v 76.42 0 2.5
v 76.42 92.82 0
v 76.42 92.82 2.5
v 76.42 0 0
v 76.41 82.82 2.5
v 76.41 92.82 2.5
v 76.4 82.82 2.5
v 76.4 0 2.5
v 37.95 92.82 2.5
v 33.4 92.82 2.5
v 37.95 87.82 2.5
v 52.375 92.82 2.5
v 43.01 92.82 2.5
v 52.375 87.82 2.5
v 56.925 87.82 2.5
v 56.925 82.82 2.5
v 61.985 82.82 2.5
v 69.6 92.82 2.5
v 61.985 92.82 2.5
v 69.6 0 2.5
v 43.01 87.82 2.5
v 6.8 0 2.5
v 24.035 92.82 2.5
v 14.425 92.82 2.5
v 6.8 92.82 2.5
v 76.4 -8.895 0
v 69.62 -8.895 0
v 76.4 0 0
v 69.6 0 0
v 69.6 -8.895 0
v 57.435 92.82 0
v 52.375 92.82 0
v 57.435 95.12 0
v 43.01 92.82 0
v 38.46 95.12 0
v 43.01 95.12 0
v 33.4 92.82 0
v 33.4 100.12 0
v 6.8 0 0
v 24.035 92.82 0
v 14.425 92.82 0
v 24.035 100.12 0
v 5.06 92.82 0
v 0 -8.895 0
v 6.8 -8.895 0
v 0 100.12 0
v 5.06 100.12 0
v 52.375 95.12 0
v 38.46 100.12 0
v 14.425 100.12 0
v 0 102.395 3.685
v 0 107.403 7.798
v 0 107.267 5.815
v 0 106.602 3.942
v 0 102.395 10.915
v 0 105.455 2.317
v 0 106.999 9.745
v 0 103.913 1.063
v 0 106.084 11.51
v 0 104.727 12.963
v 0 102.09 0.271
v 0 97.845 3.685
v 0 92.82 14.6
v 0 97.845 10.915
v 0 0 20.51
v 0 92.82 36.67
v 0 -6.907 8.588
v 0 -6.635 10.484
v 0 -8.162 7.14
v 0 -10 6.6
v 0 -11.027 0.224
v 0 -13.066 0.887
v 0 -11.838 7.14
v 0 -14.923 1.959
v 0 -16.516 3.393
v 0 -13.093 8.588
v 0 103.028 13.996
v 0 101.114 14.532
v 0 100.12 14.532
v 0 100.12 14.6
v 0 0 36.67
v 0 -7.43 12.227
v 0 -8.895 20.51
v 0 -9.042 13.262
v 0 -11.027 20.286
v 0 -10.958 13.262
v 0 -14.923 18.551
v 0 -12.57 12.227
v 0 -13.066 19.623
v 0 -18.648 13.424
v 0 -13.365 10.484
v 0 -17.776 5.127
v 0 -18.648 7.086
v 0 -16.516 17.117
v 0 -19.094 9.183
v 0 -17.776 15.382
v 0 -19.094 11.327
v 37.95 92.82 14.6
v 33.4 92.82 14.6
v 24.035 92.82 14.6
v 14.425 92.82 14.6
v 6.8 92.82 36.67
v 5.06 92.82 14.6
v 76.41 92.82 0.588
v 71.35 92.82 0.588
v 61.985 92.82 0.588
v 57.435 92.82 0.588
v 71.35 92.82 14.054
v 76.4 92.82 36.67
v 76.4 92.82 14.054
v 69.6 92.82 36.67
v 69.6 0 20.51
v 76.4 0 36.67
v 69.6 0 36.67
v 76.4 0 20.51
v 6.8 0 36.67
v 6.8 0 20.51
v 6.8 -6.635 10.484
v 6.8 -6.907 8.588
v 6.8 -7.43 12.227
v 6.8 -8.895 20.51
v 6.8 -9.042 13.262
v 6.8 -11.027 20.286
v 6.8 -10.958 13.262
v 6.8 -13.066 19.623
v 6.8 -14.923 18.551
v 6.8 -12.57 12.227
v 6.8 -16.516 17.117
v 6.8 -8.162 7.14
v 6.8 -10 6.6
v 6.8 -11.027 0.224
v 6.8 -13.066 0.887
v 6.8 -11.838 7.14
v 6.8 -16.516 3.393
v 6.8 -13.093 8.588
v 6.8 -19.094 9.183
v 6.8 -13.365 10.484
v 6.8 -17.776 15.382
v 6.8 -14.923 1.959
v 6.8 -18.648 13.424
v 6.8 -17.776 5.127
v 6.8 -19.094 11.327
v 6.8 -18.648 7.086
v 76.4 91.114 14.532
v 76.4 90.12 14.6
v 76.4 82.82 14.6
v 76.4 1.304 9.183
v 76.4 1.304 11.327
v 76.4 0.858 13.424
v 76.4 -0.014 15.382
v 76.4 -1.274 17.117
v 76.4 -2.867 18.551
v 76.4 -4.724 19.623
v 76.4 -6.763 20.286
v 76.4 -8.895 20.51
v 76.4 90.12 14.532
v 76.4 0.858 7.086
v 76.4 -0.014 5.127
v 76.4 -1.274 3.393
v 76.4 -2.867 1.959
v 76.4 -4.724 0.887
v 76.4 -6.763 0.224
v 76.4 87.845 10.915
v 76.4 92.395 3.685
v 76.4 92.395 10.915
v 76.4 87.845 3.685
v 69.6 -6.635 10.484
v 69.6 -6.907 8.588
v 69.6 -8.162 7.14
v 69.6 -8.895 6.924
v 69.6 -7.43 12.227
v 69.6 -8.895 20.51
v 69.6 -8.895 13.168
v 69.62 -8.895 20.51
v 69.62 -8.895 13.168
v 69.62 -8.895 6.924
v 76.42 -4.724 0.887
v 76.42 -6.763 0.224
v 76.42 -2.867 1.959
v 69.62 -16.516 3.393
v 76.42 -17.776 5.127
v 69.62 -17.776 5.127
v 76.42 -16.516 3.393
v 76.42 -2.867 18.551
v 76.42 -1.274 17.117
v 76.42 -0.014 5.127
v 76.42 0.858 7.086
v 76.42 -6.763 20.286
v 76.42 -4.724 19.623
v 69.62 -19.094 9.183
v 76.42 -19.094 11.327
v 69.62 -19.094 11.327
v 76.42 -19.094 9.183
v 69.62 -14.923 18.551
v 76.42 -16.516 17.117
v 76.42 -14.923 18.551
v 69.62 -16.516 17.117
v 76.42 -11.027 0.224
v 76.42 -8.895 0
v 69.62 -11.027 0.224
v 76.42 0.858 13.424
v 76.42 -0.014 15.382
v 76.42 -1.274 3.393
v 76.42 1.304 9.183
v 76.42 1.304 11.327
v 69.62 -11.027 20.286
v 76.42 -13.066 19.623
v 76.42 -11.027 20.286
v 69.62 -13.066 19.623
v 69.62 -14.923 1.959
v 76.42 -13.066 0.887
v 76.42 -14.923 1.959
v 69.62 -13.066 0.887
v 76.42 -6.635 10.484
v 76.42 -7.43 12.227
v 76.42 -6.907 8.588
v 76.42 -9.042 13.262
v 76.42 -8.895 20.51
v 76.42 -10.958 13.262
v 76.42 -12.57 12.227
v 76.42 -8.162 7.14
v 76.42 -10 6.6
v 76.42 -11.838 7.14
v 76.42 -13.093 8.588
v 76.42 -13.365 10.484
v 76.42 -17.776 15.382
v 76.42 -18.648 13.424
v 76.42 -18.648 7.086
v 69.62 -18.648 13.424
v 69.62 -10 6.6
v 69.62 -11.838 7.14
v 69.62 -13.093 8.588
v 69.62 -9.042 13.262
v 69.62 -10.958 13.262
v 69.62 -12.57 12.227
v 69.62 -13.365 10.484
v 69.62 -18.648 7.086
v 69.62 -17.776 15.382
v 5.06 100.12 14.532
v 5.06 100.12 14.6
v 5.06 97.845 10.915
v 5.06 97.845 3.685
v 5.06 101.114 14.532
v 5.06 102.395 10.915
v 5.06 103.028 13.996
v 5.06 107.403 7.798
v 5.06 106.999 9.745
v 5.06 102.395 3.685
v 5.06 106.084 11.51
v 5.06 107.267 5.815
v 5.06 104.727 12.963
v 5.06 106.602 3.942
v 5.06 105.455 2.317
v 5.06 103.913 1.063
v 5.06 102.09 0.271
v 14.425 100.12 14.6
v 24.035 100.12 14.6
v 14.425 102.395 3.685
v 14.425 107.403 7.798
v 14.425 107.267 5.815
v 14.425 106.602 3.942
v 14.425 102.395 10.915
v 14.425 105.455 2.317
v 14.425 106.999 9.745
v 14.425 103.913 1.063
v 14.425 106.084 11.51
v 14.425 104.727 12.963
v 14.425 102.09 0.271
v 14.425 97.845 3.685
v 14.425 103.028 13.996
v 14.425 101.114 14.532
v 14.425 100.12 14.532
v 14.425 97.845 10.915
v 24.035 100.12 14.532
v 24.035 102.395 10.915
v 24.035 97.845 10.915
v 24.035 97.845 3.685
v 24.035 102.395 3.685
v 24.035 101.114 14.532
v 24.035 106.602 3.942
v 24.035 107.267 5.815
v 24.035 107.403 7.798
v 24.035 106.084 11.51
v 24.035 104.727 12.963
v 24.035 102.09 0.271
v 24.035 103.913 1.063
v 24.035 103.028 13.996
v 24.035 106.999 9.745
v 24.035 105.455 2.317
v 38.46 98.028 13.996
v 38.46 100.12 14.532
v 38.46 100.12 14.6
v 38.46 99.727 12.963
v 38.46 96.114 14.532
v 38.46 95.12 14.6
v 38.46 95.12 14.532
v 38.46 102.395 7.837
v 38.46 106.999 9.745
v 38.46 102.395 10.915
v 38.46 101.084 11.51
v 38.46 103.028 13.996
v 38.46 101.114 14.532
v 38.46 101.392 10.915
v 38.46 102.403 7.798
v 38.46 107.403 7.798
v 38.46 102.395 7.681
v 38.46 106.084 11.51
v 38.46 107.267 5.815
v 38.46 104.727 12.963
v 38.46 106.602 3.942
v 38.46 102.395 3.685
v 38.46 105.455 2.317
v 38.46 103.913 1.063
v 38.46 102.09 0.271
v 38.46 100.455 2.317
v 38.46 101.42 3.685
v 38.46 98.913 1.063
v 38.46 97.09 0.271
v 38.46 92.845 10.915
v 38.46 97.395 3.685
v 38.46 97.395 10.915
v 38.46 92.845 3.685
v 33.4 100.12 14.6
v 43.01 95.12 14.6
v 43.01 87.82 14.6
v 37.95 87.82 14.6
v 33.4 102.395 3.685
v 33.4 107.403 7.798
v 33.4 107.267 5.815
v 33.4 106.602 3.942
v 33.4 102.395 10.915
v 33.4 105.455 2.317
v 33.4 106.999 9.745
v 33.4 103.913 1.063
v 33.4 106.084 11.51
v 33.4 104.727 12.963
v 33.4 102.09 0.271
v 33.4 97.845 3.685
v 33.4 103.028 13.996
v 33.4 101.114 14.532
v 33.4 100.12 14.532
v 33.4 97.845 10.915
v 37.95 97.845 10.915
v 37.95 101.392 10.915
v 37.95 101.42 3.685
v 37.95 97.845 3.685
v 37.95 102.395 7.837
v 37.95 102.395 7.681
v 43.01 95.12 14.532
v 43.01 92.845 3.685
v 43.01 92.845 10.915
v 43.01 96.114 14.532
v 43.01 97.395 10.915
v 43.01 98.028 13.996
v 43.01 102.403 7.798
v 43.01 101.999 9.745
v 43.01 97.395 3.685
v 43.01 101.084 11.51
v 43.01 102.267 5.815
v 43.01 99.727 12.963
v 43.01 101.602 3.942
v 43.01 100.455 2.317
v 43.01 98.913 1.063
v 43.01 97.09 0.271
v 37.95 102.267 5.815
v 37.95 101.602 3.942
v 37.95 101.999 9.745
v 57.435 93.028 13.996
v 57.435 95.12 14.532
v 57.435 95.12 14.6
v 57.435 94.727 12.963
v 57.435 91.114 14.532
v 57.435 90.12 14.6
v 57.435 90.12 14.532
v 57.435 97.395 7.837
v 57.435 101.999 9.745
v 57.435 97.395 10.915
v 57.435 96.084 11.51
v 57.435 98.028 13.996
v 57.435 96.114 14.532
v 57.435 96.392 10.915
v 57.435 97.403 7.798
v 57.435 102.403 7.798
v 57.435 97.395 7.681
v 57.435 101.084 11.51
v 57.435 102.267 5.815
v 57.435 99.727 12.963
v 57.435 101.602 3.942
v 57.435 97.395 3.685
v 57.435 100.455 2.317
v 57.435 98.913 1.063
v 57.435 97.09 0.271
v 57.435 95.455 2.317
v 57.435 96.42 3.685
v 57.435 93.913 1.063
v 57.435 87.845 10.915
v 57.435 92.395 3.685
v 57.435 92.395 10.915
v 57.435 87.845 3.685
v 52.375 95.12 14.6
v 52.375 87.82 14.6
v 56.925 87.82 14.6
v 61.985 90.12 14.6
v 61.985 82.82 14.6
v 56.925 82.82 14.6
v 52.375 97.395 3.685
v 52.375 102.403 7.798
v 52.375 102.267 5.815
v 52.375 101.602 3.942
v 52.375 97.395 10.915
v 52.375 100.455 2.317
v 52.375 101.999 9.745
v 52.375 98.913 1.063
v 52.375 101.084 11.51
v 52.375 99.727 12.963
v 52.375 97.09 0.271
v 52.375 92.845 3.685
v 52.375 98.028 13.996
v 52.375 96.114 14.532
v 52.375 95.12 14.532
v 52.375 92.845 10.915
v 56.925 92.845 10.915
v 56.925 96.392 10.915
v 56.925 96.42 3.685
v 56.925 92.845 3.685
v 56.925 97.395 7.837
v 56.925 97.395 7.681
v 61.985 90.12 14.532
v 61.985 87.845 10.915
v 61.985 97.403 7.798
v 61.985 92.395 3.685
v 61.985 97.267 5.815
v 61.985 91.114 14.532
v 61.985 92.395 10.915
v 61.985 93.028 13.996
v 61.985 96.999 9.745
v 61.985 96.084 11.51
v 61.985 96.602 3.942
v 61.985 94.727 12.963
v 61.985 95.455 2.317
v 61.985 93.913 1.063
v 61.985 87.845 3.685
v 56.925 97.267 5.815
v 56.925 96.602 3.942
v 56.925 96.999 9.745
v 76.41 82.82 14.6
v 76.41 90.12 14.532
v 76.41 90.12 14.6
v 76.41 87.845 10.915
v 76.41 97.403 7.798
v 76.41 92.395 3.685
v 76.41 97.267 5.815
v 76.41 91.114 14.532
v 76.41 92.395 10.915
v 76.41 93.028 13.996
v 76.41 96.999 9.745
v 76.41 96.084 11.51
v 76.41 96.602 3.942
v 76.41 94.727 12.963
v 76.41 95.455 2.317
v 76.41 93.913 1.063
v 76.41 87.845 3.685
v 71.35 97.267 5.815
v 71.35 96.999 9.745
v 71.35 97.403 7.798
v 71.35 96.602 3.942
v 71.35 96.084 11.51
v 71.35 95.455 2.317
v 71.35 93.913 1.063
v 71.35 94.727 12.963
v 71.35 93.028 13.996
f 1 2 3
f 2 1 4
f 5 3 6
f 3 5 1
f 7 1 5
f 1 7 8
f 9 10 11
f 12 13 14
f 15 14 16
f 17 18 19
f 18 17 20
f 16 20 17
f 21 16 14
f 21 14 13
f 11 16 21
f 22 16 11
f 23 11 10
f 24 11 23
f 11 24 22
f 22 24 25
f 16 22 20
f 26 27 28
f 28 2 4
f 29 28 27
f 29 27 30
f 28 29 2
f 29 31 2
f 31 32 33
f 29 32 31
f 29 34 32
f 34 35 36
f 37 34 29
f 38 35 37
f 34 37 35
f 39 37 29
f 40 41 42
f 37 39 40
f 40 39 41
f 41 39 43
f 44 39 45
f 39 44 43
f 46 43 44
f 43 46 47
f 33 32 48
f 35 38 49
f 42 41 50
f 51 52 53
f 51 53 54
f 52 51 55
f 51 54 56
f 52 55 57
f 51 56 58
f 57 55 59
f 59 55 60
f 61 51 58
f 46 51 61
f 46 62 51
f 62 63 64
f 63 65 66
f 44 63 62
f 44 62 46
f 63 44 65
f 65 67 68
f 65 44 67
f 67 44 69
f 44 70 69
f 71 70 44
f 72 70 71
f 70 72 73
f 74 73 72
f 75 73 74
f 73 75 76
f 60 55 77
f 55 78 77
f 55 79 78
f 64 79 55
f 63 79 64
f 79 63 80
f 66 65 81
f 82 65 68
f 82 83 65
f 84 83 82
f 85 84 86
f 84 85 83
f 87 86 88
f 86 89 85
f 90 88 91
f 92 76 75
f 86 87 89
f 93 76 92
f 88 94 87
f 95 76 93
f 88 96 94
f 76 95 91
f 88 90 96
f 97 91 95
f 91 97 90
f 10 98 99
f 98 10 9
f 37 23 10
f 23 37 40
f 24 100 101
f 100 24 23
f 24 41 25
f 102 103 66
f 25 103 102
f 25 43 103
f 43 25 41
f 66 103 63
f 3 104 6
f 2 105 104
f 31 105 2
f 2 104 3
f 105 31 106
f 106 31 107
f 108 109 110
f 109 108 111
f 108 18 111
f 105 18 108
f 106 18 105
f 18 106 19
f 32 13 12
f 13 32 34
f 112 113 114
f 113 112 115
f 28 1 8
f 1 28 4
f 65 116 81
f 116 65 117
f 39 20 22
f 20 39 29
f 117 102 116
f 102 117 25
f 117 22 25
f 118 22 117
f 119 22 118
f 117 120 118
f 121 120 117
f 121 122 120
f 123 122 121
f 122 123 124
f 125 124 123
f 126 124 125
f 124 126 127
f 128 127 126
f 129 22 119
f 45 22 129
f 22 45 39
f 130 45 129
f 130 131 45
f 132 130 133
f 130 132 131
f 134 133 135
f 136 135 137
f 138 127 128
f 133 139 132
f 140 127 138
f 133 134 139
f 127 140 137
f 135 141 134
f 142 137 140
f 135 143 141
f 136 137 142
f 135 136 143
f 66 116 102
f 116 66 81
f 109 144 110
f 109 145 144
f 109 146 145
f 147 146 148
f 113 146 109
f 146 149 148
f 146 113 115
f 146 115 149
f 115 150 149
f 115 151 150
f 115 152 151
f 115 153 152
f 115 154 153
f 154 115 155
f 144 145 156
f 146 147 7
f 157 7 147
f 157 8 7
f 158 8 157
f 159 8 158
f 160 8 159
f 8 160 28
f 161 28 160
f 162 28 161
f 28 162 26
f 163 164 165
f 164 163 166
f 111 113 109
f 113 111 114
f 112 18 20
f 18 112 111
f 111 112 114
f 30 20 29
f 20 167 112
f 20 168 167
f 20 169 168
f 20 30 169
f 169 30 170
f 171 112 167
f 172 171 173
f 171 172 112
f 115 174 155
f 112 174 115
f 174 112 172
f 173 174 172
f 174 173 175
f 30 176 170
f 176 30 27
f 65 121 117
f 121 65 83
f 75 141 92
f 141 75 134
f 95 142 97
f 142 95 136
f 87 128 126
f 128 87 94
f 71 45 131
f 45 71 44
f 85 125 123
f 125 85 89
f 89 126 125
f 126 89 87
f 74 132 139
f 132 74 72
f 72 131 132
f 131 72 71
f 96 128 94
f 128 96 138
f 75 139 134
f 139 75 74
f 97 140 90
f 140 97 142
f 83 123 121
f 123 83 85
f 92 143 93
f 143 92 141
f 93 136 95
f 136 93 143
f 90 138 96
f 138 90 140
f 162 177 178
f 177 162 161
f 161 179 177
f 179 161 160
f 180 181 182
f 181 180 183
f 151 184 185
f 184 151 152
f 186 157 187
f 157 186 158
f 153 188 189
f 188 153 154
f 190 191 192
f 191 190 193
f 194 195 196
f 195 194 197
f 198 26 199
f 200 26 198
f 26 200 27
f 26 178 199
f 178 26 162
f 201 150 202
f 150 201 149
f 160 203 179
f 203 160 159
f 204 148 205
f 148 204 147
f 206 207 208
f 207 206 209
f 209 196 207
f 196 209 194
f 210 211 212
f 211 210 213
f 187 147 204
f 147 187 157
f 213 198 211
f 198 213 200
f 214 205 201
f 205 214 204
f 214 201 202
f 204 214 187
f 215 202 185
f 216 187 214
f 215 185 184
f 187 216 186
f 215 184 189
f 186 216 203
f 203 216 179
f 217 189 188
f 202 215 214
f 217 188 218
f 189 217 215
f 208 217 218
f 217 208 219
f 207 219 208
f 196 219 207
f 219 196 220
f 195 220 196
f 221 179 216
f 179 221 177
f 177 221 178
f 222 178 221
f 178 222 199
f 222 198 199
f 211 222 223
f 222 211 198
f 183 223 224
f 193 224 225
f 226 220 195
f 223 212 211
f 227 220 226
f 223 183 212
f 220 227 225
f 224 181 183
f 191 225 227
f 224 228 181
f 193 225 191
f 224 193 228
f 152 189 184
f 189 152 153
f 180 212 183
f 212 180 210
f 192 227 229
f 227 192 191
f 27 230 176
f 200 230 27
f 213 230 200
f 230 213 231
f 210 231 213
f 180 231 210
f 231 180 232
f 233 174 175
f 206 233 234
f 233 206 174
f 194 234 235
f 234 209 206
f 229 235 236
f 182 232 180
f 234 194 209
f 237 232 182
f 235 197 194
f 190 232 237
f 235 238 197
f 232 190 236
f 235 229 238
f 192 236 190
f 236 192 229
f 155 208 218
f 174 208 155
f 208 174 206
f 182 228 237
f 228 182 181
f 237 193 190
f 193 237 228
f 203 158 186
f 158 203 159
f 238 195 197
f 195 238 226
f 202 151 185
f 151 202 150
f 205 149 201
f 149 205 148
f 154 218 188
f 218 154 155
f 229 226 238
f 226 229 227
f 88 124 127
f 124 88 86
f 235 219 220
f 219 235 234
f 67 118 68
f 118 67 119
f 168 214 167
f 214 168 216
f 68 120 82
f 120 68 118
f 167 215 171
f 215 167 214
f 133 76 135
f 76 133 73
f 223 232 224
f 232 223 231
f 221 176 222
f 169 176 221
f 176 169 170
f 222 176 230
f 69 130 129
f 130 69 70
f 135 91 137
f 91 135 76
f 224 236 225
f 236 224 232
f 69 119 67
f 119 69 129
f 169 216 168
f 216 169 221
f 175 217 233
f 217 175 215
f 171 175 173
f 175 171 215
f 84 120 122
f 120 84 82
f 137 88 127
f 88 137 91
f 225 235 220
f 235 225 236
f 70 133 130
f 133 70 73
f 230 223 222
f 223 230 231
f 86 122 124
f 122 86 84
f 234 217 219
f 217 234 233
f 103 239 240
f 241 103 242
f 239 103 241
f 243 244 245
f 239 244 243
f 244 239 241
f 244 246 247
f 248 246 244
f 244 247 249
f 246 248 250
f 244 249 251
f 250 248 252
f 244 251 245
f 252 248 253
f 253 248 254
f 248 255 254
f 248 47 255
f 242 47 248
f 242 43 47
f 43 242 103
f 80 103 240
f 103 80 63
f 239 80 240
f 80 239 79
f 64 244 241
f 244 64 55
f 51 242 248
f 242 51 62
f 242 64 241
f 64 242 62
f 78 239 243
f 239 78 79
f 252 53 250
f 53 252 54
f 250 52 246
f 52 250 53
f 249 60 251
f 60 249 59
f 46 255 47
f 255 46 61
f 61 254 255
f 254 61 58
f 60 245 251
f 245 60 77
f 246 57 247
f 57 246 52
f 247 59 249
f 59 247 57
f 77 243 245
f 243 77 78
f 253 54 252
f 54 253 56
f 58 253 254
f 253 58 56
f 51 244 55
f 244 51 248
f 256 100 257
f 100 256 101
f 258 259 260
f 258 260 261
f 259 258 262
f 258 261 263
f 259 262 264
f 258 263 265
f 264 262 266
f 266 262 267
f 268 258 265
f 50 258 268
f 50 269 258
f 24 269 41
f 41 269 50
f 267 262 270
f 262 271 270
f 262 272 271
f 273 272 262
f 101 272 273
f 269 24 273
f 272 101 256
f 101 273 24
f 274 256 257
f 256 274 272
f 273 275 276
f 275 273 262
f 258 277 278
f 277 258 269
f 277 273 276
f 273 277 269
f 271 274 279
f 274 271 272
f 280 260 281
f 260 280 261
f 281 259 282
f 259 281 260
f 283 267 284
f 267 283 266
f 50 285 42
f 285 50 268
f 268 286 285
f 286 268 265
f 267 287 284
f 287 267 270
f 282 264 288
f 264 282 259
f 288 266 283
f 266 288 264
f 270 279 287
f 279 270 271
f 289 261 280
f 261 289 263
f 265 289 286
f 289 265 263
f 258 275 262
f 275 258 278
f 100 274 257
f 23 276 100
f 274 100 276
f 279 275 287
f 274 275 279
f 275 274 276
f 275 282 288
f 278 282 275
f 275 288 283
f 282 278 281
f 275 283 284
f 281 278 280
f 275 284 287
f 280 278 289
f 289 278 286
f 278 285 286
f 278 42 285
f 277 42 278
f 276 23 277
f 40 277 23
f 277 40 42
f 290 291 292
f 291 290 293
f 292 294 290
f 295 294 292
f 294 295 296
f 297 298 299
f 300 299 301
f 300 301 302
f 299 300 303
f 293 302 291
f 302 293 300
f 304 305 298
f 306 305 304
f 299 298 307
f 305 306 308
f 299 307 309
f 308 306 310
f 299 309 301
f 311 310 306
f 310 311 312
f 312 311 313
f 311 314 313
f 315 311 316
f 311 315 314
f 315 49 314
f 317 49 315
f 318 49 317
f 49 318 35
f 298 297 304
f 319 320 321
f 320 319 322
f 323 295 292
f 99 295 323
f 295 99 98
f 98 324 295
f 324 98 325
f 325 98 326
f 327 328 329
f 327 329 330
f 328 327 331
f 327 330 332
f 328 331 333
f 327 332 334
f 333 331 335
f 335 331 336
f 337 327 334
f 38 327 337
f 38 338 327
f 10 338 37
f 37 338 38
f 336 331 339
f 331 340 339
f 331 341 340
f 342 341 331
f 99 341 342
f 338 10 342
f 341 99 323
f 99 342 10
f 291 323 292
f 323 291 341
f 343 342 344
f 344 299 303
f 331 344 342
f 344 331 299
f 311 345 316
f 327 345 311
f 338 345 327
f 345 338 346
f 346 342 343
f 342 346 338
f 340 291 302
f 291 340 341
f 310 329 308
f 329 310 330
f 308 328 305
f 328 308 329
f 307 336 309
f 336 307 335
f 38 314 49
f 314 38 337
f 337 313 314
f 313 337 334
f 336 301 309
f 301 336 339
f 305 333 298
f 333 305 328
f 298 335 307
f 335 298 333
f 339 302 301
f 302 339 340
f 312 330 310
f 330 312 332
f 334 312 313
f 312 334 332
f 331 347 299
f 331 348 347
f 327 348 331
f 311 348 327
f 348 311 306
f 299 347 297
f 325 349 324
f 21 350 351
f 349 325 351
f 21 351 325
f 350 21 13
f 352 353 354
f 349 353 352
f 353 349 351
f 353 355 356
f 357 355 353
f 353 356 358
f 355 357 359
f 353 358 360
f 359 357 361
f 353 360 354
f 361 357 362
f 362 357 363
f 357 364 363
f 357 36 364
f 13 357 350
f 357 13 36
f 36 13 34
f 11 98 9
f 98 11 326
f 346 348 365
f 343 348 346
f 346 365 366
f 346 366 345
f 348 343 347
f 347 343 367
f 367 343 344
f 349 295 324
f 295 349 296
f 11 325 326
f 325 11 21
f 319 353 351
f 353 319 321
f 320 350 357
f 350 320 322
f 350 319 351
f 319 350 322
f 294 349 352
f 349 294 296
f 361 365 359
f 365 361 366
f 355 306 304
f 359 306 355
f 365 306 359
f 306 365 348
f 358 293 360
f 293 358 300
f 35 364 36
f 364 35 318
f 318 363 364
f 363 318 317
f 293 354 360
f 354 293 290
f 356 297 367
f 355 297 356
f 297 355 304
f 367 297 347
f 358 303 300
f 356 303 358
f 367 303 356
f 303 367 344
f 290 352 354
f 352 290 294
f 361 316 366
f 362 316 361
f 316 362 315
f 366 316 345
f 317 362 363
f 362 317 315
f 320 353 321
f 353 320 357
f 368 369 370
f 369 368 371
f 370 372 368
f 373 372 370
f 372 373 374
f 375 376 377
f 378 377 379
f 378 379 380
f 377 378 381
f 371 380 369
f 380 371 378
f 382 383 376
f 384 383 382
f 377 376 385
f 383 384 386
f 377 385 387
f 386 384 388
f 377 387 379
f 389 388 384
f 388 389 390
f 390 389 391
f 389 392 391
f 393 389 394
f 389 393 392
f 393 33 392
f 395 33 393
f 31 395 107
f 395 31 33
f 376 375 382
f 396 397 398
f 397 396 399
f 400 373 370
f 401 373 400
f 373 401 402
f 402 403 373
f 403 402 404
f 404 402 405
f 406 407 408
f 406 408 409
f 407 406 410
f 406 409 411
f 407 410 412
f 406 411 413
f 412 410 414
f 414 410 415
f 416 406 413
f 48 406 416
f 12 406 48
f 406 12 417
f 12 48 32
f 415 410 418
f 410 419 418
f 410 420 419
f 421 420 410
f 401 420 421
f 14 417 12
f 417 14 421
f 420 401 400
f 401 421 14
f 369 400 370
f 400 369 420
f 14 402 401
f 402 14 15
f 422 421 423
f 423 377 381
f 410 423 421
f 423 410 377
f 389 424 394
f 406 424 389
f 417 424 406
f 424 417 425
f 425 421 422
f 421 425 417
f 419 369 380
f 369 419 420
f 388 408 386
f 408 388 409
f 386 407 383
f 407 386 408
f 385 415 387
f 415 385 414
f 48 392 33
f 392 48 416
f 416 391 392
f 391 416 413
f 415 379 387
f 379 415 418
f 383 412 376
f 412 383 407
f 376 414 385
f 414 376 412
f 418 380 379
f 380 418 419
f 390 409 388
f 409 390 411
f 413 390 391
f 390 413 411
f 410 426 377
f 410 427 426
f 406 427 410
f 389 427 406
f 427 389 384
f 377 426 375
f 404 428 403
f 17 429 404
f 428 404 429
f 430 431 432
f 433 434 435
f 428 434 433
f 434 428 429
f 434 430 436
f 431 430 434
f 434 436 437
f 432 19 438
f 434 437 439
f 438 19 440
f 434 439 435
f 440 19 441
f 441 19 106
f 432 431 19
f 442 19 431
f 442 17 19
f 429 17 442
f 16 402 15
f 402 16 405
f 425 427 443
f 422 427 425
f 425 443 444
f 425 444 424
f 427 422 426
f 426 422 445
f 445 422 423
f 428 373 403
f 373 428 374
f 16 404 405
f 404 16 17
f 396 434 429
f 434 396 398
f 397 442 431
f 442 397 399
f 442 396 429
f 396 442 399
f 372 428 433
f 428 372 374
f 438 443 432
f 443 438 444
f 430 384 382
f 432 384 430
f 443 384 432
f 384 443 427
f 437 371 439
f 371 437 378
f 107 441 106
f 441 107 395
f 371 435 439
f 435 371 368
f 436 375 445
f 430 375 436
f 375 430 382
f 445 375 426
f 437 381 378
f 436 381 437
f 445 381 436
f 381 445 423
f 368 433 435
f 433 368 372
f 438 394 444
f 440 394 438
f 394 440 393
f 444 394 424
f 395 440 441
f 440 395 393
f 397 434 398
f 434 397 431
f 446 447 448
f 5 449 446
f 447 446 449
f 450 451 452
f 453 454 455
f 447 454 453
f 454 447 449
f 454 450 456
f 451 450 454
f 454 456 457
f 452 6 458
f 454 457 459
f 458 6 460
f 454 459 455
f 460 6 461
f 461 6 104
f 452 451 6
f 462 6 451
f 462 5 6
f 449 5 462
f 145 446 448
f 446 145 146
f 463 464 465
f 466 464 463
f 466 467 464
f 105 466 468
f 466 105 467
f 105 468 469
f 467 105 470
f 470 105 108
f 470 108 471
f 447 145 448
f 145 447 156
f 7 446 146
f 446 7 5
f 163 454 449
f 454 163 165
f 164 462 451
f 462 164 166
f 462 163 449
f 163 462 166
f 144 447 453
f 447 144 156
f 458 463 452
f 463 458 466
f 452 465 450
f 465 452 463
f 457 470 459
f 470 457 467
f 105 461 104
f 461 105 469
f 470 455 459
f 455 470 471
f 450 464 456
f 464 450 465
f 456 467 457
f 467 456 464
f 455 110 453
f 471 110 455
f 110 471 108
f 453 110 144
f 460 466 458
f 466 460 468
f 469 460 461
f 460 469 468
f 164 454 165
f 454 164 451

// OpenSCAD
x_center = 73;      
x_length = 6.8;     
y_length = 35.58;   
z_length = 20.51;   

// Test
y_center = y_length / 2;


union() {
cube([76.42, 92.82, 2.5]);
cube([6.8,92.82, 36.67]);
translate([x_center - x_length / 2, 0, 0])
    cube([6.8,92.82, 36.67]);
}

difference() {
    union(){
    translate([x_center - x_length / 2, -y_center/2, 0])
    cube([x_length, 3*(y_length/4) , z_length]);

    translate([0, -y_center/2, 0])
    cube([x_length, 3*(y_length/4) , z_length]);
    
    translate([0,-y_length/4, z_length/2])
    rotate([0,90,0])
        cylinder(h=x_length ,d=z_length);
        
    translate([69.62,-y_length/4, z_length/2])
    rotate([0,90,0])
        cylinder(h=x_length ,d=z_length);
    }


translate([-1,-10,10])
    rotate([0,90,0])
    cylinder(r = 3.4, h = 80);
}


x_hole = 20;
y_hole = 4.55;
z_hole = 7.23;
space = 14.425;


union(){
difference() {
    
    translate([0,92.82,0])
        cube([5.06,7.3,14.6]);
    
    translate([-x_hole/2,-y_hole/2+92.82+7.3,-z_hole/2+7.3])
        cube([x_hole,y_hole,z_hole]);

}    

difference(){

    translate([0,92.82+7.3,7.3])
    rotate([0,90,0])
        cylinder(r=7.3, h=5.06);

    translate([-x_hole/2,-y_hole/2+92.82+7.3,-z_hole/2+7.3])
        cube([x_hole,y_hole,z_hole]);
}
}


union(){
difference() {
    
    translate([space,92.82,0])
        cube([5.06,7.3,14.6]);
    
    translate([-x_hole/2+space,-y_hole/2+92.82+7.3,-z_hole/2+7.3])
        cube([x_hole,y_hole,z_hole]);

}    

difference(){

    translate([space,92.82+7.3,7.3])
    rotate([0,90,0])
        cylinder(r=7.3, h=5.06);

    translate([-x_hole/2+space,-y_hole/2+92.82+7.3,-z_hole/2+7.3])
        cube([x_hole,y_hole,z_hole]);
}
}

union(){
difference() {
    
    translate([space+y_hole,92.82,0])
        cube([5.06,7.3,14.6]);
    
    translate([-x_hole/2+space+y_hole,-y_hole/2+92.82+7.3,-z_hole/2+7.3])
        cube([x_hole,y_hole,z_hole]);

}    

difference(){

    translate([space+y_hole,92.82+7.3,7.3])
    rotate([0,90,0])
        cylinder(r=7.3, h=5.06);

    translate([-x_hole/2+space+y_hole,-y_hole/2+92.82+7.3,-z_hole/2+7.3])
        cube([x_hole,y_hole,z_hole]);
}
}

union(){
difference() {
    
    translate([2*space+y_hole,92.82,0])
        cube([5.06,7.3,14.6]);
    
    translate([-x_hole/2+2*space+y_hole,-y_hole/2+92.82+7.3,-z_hole/2+7.3])
        cube([x_hole,y_hole,z_hole]);

}    

difference(){

    translate([2*space+y_hole,92.82+7.3,7.3])
    rotate([0,90,0])
        cylinder(r=7.3, h=5.06);

    translate([-x_hole/2+2*space+y_hole,-y_hole/2+92.82+7.3,-z_hole/2+7.3])
        cube([x_hole,y_hole,z_hole]);
}
}

union(){
difference() {
    
    translate([2*space+2*y_hole,92.82-5,0])
        cube([5.06,7.3,14.6]);
    
    translate([-x_hole/2+2*space+2*y_hole,-y_hole/2+92.82+7.3-5,-z_hole/2+7.3])
        cube([x_hole,y_hole,z_hole]);

}    

difference(){

    translate([2*space+2*y_hole,92.82+7.3-5,7.3])
    rotate([0,90,0])
        cylinder(r=7.3, h=5.06);

    translate([-x_hole/2+2*space+2*y_hole,-y_hole/2+92.82+7.3-5,-z_hole/2+7.3])
        cube([x_hole,y_hole,z_hole]);
}
}

union(){
difference() {
    
    translate([3*space+2*y_hole,92.82-5,0])
        cube([5.06,7.3,14.6]);
    
    translate([-x_hole/2+3*space+2*y_hole,-y_hole/2+92.82+7.3-5,-z_hole/2+7.3])
        cube([x_hole,y_hole,z_hole]);

}    

difference(){

    translate([3*space+2*y_hole,92.82+7.3-5,7.3])
    rotate([0,90,0])
        cylinder(r=7.3, h=5.06);

    translate([-x_hole/2+3*space+2*y_hole,-y_hole/2+92.82+7.3-5,-z_hole/2+7.3])
        cube([x_hole,y_hole,z_hole]);
}
}

union(){
difference() {
    
    translate([3*space+3*y_hole,92.82-10,0])
        cube([5.06,7.3,14.6]);
    
    translate([-x_hole/2+3*space+3*y_hole,-y_hole/2+92.82+7.3-10,-z_hole/2+7.3])
        cube([x_hole,y_hole,z_hole]);

}    

difference(){

    translate([3*space+3*y_hole,92.82+7.3-10,7.3])
    rotate([0,90,0])
        cylinder(r=7.3, h=5.06);

    translate([-x_hole/2+3*space+3*y_hole,-y_hole/2+92.82+7.3-10,-z_hole/2+7.3])
        cube([x_hole,y_hole,z_hole]);
}
}

union(){
difference() {
    
    translate([4*space+3*y_hole,92.82-10,0])
        cube([5.06,7.3,14.6]);
    
    translate([-x_hole/2+4*space+3*y_hole,-y_hole/2+92.82+7.3-10,-z_hole/2+7.3])
        cube([x_hole,y_hole,z_hole]);

}    

difference(){

    translate([4*space+3*y_hole,92.82+7.3-10,7.3])
    rotate([0,90,0])
        cylinder(r=7.3, h=5.06);

    translate([-x_hole/2+4*space+3*y_hole,-y_hole/2+92.82+7.3-10,-z_hole/2+7.3])
        cube([x_hole,y_hole,z_hole]);
}
}
